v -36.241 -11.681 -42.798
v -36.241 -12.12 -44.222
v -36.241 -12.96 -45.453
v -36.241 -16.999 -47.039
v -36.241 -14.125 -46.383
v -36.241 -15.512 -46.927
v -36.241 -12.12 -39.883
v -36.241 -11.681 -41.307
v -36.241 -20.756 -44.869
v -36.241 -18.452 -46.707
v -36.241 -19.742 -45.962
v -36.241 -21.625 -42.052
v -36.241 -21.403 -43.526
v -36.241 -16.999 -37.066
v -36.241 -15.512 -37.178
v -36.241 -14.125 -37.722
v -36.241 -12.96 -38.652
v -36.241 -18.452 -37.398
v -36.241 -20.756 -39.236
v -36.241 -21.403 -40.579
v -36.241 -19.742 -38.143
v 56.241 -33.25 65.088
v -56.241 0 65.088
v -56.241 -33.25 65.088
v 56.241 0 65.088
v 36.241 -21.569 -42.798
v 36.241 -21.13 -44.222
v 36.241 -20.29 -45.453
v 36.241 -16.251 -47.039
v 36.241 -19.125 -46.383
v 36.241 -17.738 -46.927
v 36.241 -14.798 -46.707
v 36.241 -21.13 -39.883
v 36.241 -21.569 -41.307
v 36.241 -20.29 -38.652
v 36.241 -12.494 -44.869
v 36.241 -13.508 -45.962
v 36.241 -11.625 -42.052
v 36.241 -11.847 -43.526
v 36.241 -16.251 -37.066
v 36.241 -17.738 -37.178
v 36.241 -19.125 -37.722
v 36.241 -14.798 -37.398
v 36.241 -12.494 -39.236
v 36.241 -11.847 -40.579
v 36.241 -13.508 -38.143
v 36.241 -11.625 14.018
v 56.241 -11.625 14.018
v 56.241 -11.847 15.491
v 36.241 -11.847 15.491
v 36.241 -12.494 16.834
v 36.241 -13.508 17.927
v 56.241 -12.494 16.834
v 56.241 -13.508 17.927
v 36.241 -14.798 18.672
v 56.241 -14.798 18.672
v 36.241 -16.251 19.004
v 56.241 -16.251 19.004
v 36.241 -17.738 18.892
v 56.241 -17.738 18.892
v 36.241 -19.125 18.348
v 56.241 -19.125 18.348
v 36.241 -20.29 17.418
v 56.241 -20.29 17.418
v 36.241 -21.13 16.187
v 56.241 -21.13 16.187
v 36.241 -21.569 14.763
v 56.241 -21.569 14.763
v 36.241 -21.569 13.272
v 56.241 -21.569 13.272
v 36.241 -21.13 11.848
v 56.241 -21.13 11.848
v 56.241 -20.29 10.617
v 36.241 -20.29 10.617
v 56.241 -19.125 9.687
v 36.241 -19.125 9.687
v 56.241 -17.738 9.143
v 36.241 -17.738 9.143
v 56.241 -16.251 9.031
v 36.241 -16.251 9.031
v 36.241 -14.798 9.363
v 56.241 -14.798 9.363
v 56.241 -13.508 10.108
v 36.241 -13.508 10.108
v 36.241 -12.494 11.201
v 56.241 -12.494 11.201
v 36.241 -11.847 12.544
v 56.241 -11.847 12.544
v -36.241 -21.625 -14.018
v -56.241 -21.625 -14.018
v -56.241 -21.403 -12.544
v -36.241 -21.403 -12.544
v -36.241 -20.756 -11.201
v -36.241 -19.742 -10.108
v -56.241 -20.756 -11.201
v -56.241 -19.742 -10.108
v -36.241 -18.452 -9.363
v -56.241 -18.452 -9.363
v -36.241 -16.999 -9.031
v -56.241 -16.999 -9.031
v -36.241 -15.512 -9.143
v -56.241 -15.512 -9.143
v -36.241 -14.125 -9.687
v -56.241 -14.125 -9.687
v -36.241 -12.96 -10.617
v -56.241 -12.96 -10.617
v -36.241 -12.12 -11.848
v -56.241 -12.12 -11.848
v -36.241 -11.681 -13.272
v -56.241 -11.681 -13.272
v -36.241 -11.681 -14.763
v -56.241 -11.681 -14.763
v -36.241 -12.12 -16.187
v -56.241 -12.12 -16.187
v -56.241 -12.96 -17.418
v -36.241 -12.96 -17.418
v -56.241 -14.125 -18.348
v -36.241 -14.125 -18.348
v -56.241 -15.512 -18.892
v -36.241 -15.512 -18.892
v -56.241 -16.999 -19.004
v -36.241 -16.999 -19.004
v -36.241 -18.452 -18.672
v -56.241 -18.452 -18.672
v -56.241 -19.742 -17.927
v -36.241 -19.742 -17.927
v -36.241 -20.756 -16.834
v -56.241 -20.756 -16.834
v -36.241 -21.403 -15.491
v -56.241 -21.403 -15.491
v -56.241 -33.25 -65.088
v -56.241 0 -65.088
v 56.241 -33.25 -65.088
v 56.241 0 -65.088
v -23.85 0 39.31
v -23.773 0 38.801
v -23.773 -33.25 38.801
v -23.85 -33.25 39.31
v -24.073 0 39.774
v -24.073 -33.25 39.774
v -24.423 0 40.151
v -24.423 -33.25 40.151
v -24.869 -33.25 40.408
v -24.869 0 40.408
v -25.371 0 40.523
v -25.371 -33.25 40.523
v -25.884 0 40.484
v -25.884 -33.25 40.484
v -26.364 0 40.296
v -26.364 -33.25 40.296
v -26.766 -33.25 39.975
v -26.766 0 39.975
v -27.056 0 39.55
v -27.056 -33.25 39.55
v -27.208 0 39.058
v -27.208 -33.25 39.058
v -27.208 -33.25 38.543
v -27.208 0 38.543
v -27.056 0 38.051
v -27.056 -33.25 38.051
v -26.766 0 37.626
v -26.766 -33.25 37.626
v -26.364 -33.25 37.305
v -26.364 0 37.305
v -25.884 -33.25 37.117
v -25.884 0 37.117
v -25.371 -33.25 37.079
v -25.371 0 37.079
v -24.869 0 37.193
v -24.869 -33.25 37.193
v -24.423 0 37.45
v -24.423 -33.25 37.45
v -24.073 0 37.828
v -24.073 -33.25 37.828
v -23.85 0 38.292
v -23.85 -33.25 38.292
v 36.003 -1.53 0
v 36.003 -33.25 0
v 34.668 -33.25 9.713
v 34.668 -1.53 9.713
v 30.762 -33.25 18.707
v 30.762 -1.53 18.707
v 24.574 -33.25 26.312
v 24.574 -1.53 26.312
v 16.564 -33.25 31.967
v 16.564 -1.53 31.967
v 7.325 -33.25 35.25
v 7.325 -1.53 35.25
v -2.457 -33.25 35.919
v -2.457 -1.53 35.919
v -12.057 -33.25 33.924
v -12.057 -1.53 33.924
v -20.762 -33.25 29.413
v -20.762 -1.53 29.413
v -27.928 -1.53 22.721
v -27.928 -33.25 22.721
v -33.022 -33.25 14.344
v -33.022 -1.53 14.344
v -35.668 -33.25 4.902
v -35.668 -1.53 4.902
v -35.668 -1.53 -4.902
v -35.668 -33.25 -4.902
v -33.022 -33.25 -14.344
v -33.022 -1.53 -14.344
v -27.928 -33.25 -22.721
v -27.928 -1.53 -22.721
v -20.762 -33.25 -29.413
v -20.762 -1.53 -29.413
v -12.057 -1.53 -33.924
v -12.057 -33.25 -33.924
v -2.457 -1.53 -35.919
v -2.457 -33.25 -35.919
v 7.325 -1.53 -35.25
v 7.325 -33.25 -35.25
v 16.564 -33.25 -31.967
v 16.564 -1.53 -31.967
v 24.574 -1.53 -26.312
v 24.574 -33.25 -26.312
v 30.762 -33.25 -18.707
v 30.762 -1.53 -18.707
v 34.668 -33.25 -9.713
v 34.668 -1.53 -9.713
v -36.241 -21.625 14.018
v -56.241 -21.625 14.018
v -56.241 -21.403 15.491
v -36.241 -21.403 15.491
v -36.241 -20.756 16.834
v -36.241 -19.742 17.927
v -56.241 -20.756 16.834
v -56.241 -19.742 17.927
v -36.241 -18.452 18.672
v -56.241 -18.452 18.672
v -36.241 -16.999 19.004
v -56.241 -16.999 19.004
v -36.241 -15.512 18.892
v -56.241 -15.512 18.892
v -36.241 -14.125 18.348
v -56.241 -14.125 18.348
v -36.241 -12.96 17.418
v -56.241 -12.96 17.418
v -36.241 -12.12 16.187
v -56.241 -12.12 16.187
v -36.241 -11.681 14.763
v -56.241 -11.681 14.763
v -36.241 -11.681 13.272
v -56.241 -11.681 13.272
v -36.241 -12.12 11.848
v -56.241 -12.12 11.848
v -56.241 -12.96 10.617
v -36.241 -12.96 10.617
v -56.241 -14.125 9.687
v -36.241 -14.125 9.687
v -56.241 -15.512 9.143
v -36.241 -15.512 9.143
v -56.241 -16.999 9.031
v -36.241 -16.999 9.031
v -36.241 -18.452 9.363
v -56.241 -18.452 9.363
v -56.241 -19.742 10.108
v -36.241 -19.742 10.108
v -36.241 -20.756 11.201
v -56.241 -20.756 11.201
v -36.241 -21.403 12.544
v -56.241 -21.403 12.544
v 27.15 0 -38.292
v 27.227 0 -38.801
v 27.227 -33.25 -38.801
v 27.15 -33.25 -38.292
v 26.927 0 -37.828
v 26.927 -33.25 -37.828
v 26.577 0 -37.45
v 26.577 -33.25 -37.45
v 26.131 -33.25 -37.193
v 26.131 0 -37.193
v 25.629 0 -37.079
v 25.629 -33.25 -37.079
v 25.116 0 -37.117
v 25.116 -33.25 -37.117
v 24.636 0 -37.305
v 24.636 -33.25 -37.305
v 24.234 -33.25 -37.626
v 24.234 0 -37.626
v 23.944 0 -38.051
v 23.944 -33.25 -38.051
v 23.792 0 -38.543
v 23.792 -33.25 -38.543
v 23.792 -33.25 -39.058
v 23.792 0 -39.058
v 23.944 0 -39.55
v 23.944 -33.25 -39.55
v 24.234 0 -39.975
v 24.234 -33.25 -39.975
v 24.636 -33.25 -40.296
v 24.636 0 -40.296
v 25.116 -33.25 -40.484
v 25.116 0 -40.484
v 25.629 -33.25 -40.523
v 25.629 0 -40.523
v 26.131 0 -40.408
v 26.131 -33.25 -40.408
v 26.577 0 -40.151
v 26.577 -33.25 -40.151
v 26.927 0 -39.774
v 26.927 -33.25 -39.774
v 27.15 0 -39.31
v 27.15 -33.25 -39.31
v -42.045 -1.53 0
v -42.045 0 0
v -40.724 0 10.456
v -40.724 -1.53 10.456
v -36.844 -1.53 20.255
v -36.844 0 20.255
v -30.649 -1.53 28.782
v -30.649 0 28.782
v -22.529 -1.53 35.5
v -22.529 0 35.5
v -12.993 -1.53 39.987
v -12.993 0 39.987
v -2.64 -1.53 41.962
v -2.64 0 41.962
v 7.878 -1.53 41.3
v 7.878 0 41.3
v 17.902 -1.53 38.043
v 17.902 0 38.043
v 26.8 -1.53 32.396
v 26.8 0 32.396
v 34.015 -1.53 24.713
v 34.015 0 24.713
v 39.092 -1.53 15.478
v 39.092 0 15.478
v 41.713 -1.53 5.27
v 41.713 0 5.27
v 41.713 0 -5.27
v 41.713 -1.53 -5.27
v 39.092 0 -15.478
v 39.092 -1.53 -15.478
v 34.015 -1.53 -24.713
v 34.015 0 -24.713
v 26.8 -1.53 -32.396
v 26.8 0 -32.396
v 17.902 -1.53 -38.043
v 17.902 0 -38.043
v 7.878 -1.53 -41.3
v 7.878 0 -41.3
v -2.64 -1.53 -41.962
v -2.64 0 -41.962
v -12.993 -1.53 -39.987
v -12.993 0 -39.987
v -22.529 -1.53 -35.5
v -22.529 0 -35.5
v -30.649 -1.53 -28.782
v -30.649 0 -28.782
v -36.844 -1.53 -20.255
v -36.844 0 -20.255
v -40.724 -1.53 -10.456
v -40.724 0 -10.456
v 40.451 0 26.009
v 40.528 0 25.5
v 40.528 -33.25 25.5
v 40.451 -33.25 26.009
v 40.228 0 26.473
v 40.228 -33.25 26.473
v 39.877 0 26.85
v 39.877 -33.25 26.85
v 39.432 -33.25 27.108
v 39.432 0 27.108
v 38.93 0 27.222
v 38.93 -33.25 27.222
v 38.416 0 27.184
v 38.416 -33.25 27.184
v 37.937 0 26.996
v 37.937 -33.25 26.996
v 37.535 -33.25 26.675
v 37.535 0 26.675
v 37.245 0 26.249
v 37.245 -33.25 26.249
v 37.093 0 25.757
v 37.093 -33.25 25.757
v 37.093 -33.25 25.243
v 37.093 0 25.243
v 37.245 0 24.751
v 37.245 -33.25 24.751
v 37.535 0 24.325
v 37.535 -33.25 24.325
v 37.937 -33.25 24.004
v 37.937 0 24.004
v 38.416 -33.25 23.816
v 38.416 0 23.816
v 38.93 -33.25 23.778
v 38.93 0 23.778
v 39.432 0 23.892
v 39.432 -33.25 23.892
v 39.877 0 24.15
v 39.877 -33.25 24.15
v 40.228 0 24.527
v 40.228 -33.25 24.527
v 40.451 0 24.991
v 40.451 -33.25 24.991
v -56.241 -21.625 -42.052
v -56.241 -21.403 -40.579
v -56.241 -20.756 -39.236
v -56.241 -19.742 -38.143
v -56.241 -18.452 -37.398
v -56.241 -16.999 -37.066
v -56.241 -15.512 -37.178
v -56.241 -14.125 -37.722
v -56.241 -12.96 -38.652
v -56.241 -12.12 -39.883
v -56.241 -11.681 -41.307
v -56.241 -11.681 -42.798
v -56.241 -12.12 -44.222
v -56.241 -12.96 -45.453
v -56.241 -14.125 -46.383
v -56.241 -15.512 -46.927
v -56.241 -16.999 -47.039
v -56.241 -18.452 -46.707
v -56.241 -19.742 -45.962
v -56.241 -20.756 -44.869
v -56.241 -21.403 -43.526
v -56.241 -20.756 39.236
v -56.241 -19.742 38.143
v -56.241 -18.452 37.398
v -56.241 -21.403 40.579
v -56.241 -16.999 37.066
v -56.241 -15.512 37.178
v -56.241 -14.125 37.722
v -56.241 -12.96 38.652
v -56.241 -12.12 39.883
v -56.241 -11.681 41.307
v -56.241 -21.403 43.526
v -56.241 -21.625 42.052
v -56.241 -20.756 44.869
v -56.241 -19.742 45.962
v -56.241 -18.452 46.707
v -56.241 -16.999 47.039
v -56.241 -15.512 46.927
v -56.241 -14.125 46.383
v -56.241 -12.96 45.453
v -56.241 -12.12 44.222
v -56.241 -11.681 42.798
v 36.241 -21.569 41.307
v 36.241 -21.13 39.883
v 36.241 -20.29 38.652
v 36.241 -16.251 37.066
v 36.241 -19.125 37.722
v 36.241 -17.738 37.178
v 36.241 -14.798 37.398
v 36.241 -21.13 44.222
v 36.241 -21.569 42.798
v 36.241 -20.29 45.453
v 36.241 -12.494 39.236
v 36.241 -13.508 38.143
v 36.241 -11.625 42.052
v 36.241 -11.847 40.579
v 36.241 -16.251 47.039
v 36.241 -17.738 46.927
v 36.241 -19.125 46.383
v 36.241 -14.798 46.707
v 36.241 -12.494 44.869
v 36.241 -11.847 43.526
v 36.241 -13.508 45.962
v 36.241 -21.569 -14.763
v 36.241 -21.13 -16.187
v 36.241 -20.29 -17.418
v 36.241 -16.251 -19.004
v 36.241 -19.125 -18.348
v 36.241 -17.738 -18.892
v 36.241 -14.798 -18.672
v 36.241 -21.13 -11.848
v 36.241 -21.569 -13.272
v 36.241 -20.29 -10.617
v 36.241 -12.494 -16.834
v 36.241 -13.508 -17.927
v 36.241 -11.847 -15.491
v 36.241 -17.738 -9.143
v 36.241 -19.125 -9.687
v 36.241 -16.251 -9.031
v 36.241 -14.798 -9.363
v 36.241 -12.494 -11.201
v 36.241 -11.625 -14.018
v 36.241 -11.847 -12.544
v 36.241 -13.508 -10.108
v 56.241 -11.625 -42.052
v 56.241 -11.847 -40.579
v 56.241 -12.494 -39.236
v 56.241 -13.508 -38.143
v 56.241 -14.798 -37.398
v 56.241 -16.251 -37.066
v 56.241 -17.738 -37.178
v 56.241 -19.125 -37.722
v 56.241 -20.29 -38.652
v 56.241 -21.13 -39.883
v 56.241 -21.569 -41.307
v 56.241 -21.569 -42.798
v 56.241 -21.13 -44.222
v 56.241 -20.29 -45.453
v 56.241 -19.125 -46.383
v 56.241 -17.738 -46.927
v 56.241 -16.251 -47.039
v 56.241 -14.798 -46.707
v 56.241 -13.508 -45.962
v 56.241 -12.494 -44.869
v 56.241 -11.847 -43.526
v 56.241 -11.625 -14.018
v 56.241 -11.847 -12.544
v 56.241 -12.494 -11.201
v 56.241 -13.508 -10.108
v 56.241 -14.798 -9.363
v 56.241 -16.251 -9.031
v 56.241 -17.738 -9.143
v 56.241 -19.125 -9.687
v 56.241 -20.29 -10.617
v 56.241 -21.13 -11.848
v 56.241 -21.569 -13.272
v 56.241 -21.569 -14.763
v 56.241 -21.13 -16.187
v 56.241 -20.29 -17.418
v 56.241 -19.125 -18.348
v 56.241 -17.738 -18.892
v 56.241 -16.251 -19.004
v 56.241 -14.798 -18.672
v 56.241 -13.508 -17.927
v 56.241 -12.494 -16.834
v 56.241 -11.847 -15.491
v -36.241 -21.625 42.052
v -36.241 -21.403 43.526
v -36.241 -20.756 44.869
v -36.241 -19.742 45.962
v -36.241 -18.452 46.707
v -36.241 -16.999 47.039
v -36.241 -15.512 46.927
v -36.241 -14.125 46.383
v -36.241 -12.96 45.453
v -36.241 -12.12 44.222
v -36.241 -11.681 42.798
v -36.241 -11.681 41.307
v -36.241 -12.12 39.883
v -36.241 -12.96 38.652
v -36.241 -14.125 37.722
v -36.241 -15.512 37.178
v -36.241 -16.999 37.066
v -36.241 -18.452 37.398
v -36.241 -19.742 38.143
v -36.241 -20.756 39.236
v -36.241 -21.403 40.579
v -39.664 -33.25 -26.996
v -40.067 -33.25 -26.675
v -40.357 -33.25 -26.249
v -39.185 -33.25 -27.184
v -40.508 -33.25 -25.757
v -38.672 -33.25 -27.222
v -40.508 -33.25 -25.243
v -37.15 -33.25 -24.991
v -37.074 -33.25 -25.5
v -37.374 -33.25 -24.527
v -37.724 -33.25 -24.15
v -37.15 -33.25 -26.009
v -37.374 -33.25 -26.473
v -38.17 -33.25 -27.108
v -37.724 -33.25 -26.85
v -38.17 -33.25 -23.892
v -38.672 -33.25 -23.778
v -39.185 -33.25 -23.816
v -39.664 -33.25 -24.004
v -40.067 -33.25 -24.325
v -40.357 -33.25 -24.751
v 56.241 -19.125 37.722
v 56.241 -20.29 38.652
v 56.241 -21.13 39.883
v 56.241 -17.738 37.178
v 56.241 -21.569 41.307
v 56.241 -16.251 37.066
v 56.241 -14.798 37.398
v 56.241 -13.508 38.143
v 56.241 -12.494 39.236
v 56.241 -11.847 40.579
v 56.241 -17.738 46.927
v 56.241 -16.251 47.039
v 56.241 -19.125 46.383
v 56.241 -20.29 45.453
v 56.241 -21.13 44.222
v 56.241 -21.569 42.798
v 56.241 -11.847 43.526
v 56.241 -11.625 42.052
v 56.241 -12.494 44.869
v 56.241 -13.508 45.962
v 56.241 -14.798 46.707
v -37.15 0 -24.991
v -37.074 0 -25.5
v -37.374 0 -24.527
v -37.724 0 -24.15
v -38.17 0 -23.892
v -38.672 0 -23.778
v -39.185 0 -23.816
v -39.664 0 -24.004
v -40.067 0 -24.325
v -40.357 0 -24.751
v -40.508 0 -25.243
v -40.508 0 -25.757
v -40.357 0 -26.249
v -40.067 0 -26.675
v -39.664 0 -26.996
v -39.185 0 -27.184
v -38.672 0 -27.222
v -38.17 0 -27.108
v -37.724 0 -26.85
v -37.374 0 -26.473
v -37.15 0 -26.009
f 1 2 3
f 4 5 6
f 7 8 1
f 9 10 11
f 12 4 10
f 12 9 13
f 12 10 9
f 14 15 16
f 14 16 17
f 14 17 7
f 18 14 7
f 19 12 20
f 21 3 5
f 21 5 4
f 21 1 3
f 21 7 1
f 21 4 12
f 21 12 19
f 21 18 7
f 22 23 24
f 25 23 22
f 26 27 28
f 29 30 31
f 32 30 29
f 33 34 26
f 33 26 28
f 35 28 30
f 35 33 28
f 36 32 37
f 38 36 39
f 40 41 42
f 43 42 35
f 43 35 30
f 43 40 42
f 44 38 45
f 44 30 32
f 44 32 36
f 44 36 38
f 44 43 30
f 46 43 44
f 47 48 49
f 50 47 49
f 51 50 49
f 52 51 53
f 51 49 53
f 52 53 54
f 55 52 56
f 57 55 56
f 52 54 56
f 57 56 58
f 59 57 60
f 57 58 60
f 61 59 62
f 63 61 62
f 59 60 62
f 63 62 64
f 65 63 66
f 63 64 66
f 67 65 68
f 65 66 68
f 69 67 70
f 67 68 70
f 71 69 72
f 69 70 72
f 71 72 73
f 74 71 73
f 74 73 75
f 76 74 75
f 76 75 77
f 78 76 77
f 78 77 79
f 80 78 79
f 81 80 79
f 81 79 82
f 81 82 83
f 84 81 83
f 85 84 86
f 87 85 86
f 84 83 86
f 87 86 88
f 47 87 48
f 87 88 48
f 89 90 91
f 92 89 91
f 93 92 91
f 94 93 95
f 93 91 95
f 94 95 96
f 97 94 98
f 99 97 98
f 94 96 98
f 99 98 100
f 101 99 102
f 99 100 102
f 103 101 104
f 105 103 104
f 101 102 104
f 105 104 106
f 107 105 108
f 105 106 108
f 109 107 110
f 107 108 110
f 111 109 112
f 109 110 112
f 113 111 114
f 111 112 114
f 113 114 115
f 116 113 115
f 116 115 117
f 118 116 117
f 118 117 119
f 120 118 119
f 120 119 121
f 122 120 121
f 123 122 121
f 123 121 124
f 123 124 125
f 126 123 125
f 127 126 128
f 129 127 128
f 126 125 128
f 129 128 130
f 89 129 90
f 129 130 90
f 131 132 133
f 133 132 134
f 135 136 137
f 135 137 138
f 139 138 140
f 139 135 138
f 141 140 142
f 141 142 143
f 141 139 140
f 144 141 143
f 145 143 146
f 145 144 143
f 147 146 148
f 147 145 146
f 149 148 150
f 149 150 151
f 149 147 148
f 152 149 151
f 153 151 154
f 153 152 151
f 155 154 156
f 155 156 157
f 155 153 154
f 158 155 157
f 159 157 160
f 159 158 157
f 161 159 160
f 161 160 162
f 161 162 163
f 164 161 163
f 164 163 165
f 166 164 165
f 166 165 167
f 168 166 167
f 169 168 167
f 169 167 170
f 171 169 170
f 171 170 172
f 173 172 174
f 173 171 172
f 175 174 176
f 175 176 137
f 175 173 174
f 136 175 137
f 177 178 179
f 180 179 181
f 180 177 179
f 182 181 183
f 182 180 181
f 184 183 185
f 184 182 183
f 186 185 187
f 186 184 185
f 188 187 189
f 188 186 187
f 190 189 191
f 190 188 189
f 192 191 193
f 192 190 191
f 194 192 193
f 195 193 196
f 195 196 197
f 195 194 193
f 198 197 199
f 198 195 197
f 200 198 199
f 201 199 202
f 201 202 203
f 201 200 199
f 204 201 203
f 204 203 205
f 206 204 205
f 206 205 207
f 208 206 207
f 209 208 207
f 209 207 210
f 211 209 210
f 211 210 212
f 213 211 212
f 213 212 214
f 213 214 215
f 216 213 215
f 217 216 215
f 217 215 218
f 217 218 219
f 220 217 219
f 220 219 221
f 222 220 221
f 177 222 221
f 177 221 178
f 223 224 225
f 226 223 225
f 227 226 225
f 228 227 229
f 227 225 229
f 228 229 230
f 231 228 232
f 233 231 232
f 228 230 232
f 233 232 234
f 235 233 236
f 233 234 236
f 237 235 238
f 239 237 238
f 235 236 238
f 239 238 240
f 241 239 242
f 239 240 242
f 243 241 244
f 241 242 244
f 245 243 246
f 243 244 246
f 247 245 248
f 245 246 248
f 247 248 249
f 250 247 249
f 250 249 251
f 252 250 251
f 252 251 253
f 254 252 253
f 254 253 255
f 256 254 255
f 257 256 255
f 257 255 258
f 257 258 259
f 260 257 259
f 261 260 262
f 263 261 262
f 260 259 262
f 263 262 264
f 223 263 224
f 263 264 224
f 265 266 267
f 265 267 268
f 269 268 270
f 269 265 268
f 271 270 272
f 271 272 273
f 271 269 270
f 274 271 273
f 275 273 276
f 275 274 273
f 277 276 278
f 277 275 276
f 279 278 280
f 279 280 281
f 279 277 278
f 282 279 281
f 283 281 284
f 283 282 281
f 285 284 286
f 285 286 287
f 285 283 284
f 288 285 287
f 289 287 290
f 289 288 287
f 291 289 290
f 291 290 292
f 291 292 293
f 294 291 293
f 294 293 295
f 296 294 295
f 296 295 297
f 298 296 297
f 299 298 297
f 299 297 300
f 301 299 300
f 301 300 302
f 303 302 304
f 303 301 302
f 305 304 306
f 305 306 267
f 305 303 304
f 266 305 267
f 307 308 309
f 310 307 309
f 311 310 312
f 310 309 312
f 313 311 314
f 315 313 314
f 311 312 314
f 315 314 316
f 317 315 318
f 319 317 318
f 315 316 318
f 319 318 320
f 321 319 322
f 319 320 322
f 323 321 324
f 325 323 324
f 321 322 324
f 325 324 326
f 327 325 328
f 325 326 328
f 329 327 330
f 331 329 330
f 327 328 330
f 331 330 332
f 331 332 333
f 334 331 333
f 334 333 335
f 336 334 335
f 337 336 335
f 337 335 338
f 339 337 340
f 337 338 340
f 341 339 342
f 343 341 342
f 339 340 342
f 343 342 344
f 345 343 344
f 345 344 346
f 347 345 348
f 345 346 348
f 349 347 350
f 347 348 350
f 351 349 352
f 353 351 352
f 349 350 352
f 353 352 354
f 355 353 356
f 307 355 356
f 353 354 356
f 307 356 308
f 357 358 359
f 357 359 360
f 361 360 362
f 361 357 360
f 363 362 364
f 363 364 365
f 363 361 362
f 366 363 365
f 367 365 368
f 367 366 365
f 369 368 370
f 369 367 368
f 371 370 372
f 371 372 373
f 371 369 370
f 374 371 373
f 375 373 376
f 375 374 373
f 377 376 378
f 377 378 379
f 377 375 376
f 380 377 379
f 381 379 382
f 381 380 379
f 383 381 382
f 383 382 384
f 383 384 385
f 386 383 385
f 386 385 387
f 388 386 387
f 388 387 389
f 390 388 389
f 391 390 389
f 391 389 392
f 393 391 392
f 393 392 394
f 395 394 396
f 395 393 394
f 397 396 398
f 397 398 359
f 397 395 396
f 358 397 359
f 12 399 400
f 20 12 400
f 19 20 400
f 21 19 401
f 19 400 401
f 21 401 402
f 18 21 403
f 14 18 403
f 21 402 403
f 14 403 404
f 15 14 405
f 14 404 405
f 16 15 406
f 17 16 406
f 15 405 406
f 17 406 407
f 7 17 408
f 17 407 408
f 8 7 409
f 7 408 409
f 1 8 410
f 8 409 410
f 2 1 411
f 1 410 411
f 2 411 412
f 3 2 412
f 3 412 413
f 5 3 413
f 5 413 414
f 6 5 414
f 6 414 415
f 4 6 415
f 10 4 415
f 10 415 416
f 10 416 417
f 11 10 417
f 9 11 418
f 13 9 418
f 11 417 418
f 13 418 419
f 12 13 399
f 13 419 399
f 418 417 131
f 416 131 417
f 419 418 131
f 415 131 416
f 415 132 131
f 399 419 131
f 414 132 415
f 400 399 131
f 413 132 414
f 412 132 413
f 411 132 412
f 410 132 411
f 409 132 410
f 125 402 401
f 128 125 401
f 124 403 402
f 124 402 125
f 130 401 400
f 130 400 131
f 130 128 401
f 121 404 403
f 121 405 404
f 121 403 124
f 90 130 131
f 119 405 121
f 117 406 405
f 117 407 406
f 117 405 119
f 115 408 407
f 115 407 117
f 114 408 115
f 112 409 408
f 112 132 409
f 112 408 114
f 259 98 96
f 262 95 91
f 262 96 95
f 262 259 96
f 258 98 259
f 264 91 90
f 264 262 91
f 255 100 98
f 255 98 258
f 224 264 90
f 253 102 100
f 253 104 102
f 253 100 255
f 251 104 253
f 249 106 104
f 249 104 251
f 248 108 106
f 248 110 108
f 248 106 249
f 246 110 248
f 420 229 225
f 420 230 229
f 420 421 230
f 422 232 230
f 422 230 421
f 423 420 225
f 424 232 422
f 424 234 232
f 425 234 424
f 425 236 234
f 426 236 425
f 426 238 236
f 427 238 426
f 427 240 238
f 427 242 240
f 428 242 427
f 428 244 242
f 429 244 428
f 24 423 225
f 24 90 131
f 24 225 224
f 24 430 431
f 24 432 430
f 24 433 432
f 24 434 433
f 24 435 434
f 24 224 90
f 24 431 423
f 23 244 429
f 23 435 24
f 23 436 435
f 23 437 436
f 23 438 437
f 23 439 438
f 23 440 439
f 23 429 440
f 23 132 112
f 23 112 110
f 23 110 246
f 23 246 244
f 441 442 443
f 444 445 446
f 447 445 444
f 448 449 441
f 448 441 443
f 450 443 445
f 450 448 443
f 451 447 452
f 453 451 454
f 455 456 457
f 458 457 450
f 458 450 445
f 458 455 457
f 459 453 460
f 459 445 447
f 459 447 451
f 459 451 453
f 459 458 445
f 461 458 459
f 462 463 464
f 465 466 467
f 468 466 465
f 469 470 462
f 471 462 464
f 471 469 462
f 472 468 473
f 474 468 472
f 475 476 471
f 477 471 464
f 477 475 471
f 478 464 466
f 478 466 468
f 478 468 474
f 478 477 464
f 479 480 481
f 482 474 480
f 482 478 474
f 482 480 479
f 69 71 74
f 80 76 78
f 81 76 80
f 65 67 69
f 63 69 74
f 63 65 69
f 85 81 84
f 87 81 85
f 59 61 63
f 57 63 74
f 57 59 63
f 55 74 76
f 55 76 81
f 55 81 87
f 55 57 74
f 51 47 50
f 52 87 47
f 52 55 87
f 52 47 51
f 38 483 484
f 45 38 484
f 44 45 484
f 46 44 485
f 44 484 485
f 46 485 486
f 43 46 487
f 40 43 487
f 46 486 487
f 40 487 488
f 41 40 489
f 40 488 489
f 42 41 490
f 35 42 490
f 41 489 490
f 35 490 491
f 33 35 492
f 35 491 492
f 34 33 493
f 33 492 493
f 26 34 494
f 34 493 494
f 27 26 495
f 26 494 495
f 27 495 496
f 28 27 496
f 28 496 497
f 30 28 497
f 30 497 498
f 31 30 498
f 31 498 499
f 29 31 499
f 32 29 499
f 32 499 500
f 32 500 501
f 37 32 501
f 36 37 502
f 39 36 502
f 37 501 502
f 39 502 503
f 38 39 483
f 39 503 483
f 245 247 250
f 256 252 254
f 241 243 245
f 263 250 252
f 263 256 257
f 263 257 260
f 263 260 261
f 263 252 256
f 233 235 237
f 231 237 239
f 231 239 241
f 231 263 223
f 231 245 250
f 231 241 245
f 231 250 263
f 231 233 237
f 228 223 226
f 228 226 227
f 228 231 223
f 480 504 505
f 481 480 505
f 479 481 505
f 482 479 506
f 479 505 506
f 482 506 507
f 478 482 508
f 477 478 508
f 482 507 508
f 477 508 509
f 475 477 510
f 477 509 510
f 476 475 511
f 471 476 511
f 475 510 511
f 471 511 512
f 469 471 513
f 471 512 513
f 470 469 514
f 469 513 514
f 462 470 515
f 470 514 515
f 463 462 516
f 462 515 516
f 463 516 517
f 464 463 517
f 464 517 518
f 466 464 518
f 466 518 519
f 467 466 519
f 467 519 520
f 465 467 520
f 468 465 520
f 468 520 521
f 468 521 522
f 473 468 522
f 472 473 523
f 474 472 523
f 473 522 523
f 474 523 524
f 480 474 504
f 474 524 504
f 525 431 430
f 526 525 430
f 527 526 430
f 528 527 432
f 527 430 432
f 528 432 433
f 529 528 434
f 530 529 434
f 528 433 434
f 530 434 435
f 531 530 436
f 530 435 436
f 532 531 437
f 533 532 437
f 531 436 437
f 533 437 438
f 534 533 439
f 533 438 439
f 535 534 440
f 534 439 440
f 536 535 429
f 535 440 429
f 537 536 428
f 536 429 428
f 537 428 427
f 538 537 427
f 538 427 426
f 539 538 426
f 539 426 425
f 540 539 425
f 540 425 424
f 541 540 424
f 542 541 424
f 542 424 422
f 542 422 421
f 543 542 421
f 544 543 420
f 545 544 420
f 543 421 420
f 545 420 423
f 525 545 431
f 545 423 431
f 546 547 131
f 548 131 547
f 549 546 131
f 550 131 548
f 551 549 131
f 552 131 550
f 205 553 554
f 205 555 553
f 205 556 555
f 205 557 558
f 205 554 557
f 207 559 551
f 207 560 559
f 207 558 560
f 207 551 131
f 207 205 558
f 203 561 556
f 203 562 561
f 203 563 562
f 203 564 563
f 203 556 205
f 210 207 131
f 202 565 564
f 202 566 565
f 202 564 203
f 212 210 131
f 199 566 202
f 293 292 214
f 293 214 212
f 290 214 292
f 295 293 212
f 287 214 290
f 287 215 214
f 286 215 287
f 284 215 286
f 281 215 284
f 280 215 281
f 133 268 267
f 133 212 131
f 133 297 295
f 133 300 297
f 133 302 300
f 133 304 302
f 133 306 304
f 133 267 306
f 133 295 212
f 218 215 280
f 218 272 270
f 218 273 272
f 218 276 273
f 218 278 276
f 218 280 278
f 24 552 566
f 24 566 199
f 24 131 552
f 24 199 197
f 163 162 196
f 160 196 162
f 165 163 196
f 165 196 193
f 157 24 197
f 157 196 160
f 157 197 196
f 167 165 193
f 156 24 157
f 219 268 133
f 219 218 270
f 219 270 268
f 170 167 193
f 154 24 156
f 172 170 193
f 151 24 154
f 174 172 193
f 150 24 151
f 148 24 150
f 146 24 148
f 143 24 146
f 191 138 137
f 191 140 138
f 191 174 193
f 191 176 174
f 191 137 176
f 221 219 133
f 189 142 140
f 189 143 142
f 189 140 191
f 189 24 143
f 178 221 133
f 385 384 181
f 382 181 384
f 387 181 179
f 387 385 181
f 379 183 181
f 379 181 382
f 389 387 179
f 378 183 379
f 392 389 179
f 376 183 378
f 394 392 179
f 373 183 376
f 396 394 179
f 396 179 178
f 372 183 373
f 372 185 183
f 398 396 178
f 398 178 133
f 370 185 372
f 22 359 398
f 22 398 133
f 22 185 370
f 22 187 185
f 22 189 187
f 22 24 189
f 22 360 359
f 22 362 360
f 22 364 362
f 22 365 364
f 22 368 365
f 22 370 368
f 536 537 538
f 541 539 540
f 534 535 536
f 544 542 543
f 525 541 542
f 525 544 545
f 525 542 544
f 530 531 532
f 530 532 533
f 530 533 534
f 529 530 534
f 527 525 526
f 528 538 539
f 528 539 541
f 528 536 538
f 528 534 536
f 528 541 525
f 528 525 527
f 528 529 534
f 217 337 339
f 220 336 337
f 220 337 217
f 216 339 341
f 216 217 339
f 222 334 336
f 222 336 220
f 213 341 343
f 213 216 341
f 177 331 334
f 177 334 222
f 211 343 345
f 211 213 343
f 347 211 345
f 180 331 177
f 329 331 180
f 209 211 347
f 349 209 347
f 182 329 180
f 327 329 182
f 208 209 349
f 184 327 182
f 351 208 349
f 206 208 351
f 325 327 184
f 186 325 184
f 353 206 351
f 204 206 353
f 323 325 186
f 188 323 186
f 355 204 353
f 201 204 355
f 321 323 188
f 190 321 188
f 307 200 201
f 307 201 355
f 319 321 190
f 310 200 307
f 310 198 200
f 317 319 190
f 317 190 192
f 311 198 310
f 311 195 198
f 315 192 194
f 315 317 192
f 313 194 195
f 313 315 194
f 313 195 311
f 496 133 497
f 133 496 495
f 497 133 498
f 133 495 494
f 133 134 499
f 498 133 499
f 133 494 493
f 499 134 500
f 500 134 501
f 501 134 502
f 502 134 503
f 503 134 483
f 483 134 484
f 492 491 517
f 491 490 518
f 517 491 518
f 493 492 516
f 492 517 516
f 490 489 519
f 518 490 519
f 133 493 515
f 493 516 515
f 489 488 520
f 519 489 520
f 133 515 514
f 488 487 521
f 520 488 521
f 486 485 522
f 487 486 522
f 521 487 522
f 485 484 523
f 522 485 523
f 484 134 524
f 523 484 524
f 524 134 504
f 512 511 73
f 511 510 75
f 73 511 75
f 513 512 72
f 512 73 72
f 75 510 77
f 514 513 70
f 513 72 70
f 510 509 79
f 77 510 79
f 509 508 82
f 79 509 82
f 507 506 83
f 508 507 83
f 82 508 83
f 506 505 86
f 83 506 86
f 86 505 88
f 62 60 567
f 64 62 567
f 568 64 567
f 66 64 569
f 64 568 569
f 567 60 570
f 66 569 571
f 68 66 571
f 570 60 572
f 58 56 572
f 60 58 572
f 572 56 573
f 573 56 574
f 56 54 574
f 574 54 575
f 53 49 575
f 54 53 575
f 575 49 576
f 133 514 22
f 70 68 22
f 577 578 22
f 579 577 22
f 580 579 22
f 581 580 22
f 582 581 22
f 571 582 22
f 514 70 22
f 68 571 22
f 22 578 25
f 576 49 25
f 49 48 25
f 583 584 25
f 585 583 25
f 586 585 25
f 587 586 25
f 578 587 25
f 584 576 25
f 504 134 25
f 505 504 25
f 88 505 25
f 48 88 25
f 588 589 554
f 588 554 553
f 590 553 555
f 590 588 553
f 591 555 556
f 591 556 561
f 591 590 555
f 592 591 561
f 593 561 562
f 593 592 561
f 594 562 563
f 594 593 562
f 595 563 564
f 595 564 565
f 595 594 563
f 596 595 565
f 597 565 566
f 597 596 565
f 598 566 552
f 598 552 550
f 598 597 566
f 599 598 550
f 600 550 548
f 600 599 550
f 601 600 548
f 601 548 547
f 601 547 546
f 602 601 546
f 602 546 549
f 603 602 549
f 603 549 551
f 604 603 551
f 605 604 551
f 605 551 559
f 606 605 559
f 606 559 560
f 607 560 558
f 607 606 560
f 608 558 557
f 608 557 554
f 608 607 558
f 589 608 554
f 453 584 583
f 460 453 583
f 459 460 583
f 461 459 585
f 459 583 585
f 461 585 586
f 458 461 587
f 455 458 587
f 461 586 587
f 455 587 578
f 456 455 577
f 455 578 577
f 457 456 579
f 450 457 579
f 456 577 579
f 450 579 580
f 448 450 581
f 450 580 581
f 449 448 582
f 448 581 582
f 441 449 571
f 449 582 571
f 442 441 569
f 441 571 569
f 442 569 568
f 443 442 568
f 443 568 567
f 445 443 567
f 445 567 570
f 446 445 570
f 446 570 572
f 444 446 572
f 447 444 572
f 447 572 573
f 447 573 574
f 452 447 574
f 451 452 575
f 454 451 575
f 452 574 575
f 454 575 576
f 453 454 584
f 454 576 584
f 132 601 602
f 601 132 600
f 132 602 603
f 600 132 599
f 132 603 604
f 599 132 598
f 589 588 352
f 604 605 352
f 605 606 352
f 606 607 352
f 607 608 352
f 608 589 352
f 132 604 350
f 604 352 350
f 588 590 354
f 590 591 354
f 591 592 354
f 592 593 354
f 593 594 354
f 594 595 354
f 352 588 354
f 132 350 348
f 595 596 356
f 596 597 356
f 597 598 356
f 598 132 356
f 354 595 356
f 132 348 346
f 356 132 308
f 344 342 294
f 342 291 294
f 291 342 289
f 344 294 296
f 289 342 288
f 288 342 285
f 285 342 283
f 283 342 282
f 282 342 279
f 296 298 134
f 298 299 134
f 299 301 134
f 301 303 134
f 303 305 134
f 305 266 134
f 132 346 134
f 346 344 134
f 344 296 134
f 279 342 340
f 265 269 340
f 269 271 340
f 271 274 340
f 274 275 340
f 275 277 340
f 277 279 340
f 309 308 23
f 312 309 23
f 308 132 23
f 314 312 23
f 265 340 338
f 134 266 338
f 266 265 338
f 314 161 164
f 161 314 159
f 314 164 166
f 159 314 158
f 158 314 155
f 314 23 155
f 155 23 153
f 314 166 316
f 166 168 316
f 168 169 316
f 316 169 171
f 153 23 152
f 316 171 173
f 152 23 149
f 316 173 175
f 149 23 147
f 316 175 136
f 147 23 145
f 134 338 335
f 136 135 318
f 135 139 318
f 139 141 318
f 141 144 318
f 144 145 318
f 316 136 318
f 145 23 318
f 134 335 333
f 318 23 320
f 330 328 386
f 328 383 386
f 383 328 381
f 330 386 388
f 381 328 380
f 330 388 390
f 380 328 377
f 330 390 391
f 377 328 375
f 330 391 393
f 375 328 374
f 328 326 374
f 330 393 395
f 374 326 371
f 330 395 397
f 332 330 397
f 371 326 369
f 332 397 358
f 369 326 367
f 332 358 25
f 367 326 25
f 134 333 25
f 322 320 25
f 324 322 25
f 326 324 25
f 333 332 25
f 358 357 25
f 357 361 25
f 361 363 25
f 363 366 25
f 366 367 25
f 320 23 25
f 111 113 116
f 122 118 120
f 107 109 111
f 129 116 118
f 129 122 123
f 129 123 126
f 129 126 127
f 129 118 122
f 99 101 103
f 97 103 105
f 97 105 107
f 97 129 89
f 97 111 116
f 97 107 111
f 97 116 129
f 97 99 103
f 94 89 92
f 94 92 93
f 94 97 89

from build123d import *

# Parameters (mm, degrees)
F0_W     = 112.482
F0_H     = 130.175
F0_R     = 1.727
F0_R_2   = 36.003
F1_DEPTH = 33.25
F2_R     = 5
F3_DEPTH = 20
F4_R     = 5
F5_DEPTH = 20
F6_R     = 42.045
F7_DEPTH = 1.53


with BuildPart() as f1:
    # F0 (on Front) → F1 (new body)
    with BuildSketch(Plane.XZ):
        Rectangle(F0_W, F0_H)
        with Locations((-38.800708, -25.5)):
            Circle(F0_R, mode=Mode.SUBTRACT)
        with Locations((25.5, -38.800708)):
            Circle(F0_R, mode=Mode.SUBTRACT)
        with Locations((-25.5, 38.800708)):
            Circle(F0_R, mode=Mode.SUBTRACT)
        with Locations((0, 0)):
            Circle(F0_R_2, mode=Mode.SUBTRACT)
        with Locations((38.800708, 25.5)):
            Circle(F0_R, mode=Mode.SUBTRACT)
    extrude(amount=F1_DEPTH)

    # F2 (on face) → F3 (cut)
    with BuildSketch(Plane(origin=(-56.241, 0, 0), x_dir=(0, -1, 0), z_dir=(-1, 0, 0))):
        with Locations((16.625, 42.0525)):
            Circle(F2_R)
        with Locations((16.625, 14.0175)):
            Circle(F2_R)
        with Locations((16.625, -14.0175)):
            Circle(F2_R)
        with Locations((16.625, -42.0525)):
            Circle(F2_R)
    extrude(amount=-F3_DEPTH, mode=Mode.SUBTRACT)

    # F4 (on face) → F5 (cut)
    with BuildSketch(Plane.YZ.offset(56.241)):
        with Locations((-16.625, 42.0525)):
            Circle(F4_R)
        with Locations((-16.625, 14.0175)):
            Circle(F4_R)
        with Locations((-16.625, -14.0175)):
            Circle(F4_R)
        with Locations((-16.625, -42.0525)):
            Circle(F4_R)
    extrude(amount=-F5_DEPTH, mode=Mode.SUBTRACT)

    # F6 (on face) → F7 (cut)
    with BuildSketch(Plane(origin=(0, 0, 0), x_dir=(-1, 0, 0), z_dir=(0, 1, 0))):
        Circle(F6_R)
    extrude(amount=-F7_DEPTH, mode=Mode.SUBTRACT)


solid = f1.part
